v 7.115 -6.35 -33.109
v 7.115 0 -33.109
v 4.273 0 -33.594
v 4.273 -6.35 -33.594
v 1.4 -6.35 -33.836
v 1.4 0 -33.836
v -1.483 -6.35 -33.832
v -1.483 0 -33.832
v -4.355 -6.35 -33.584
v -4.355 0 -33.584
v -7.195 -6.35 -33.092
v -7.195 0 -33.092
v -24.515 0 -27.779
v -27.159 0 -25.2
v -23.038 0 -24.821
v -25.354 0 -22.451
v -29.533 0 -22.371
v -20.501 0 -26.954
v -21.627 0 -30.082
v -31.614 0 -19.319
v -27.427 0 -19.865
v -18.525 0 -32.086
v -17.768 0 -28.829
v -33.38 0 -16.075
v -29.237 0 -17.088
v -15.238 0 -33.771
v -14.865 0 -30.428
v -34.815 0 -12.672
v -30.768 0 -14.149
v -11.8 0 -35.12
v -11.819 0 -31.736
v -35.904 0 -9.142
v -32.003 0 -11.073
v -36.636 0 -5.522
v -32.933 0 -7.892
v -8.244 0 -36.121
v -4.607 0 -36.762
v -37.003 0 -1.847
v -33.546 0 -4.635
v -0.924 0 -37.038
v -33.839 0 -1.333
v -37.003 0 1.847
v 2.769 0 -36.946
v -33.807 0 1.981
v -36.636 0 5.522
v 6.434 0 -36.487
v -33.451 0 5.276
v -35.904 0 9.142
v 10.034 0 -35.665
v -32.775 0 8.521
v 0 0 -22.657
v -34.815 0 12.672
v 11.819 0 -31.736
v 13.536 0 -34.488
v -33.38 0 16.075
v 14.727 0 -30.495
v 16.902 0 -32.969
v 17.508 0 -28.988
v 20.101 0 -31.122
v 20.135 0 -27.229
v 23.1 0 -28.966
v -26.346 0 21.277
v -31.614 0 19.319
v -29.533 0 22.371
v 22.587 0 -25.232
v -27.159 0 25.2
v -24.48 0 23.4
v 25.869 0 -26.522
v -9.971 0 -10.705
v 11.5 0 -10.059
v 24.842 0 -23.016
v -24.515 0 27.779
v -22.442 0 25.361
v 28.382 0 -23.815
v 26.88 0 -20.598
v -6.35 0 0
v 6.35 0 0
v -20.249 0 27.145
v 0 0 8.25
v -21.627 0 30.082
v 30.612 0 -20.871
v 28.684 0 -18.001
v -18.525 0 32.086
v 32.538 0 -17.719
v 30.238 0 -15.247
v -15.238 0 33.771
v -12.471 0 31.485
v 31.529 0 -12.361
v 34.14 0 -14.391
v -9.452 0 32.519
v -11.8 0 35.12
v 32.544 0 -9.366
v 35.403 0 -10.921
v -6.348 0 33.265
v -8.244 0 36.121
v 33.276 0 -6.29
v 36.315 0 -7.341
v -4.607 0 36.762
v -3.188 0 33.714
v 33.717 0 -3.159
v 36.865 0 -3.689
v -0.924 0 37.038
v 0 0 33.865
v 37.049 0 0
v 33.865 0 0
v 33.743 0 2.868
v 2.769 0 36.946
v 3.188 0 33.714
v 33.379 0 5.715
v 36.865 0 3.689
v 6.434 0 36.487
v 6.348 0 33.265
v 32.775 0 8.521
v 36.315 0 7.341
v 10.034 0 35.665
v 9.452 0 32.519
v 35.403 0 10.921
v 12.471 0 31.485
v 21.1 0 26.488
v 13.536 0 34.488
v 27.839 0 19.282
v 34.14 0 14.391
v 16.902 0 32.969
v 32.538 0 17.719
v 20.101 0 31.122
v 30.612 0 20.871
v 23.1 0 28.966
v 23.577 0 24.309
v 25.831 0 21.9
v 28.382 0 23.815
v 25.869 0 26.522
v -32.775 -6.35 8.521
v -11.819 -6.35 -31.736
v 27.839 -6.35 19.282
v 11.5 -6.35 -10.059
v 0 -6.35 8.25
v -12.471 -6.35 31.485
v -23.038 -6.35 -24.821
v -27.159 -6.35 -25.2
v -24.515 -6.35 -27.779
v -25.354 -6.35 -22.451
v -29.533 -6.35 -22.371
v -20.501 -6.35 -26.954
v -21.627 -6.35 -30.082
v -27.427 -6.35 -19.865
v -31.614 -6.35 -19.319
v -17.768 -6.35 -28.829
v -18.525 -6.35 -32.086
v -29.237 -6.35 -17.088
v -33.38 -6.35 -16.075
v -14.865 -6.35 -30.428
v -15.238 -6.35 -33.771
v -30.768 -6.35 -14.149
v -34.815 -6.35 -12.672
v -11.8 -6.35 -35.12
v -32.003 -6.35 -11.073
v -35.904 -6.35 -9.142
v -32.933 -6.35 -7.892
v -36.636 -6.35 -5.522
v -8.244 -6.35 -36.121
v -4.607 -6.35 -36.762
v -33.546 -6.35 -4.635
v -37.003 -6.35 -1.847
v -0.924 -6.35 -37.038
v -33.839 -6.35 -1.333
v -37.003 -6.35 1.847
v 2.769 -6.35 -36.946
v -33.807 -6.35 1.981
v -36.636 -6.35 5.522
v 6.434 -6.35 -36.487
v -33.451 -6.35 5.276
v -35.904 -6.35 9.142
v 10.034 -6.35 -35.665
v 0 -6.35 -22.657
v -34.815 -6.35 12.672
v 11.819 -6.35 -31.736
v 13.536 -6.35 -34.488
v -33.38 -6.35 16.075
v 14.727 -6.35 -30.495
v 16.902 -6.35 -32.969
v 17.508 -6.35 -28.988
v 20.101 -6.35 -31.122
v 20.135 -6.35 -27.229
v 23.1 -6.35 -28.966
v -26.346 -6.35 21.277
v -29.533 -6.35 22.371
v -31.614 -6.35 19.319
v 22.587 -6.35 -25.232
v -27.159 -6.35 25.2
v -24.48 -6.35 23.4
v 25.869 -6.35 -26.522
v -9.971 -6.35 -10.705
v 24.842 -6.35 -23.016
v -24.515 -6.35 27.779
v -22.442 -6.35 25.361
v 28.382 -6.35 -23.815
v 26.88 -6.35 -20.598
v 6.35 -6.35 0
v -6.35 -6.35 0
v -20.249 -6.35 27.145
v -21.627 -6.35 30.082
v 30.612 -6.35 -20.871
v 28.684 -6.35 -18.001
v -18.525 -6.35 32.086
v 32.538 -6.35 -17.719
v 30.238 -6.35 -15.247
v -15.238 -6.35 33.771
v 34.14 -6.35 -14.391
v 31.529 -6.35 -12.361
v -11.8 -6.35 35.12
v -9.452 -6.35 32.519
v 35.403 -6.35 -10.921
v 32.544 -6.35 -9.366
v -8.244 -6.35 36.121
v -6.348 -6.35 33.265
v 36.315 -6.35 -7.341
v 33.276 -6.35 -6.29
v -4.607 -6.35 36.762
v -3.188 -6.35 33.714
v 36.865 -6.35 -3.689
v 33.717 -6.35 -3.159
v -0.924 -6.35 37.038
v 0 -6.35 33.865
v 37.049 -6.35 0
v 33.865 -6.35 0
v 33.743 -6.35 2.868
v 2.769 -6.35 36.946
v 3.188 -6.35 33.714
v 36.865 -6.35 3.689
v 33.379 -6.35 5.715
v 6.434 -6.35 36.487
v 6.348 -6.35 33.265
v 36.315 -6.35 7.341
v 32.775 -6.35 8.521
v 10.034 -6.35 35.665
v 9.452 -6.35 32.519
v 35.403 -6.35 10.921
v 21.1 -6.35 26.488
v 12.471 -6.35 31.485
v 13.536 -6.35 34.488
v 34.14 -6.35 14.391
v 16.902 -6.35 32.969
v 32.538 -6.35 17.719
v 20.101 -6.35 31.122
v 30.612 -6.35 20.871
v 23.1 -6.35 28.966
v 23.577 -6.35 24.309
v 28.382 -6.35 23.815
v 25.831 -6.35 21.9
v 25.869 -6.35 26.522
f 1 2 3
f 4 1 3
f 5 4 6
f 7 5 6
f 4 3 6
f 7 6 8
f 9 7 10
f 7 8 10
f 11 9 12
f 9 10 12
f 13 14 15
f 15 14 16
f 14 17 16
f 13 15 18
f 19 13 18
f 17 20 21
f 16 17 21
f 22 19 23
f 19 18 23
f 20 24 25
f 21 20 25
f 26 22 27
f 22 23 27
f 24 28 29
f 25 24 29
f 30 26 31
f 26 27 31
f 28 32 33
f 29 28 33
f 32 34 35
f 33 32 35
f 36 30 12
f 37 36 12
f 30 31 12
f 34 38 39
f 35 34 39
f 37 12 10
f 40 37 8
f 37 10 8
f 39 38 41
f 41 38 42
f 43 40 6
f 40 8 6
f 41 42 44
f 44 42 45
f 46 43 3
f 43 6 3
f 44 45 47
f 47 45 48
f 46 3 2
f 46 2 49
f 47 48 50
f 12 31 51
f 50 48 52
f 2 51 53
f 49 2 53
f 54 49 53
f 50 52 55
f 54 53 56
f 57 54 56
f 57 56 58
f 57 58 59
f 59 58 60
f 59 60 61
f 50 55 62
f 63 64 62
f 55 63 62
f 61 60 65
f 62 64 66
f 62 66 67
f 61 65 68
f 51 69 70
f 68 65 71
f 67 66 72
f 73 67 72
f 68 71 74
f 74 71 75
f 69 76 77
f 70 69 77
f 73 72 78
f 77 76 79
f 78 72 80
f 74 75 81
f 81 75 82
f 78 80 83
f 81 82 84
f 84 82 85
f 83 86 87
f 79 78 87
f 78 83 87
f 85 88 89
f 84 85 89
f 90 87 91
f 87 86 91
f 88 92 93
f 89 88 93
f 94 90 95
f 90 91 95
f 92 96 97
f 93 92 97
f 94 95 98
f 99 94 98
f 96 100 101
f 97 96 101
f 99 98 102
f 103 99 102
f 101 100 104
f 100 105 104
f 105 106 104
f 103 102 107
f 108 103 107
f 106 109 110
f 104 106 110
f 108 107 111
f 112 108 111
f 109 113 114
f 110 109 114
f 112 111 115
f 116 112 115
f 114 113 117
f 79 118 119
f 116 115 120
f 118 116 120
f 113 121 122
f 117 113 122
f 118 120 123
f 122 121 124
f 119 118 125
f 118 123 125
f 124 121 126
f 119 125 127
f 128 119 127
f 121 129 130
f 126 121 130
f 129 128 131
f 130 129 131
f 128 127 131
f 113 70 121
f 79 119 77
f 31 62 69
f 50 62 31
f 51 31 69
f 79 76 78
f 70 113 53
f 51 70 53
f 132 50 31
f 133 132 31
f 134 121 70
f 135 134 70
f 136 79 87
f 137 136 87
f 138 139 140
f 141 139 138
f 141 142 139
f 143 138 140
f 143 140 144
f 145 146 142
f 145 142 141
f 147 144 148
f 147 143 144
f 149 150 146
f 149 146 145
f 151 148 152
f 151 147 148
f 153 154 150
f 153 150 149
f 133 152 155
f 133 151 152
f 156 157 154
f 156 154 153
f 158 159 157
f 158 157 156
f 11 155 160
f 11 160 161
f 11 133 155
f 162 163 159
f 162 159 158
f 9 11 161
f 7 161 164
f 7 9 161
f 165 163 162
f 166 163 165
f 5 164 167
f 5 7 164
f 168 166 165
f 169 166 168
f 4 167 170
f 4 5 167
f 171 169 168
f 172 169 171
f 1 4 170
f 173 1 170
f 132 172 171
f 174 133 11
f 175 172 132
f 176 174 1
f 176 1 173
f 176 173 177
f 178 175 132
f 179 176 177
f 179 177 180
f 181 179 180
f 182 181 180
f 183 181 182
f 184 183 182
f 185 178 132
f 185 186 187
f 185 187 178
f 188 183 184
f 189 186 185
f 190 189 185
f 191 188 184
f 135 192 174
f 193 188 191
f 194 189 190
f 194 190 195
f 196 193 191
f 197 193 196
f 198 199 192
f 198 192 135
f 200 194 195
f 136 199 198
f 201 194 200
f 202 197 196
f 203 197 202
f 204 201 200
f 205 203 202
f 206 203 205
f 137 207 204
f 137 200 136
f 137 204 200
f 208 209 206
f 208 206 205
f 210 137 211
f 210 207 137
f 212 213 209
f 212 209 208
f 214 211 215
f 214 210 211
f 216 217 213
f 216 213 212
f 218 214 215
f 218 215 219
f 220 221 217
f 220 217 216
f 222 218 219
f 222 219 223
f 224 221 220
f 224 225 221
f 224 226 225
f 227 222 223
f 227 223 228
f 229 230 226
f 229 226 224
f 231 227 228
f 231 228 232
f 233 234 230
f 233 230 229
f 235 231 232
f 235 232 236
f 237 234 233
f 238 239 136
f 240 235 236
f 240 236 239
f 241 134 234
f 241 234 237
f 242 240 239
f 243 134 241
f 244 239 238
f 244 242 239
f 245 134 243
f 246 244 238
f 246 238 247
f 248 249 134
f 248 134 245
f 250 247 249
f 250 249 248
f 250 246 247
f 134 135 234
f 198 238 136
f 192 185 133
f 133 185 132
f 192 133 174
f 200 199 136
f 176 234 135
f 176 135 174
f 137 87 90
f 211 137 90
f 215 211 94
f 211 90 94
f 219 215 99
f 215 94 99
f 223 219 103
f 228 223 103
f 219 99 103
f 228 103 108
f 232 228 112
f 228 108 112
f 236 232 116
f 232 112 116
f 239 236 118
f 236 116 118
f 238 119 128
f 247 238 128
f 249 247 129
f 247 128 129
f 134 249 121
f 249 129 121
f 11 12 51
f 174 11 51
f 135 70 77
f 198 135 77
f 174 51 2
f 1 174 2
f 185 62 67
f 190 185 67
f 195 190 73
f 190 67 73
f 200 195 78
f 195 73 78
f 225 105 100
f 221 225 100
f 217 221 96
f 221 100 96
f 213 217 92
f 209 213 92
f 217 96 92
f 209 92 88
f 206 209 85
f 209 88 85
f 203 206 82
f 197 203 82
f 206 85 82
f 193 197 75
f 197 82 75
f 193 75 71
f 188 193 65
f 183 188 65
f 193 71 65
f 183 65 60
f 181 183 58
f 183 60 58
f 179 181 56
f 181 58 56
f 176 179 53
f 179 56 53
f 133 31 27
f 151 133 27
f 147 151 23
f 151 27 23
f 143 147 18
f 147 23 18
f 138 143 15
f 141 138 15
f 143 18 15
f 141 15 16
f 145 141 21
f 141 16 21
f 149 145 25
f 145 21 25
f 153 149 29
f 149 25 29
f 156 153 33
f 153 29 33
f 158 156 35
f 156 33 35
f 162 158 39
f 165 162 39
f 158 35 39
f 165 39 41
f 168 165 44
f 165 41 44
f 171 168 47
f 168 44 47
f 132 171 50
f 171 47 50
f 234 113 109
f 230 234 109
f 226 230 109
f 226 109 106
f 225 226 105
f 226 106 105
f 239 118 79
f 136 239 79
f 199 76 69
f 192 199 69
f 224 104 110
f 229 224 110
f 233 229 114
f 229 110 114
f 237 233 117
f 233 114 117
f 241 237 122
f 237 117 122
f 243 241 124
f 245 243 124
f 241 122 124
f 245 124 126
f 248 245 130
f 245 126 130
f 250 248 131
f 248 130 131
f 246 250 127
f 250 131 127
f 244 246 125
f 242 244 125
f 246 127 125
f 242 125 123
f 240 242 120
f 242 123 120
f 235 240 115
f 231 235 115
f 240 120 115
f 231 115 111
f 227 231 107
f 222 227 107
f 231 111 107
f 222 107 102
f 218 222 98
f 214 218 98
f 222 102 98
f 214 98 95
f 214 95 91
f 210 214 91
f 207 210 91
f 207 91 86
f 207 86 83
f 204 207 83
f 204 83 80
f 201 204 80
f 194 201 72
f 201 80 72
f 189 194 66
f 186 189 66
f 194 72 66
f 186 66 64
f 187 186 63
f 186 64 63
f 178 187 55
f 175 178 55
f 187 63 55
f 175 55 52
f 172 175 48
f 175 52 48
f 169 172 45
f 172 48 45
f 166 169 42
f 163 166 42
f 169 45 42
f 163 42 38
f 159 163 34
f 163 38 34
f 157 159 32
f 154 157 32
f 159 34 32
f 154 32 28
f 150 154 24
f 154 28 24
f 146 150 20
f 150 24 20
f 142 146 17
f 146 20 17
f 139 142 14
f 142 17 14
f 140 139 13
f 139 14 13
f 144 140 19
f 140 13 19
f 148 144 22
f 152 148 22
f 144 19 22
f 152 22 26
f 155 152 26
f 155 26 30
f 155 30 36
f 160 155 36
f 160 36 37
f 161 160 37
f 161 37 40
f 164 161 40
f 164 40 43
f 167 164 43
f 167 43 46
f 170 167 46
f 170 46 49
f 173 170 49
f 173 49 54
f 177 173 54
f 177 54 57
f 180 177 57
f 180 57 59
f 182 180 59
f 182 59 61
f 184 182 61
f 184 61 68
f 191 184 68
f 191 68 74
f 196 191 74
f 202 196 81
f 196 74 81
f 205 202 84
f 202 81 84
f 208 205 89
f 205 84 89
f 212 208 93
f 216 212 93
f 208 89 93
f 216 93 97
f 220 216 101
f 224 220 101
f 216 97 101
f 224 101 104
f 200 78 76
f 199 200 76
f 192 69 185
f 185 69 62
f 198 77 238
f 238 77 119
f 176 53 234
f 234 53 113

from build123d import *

# Parameters (mm, degrees)
F0_R     = 37.049444
F1_DEPTH = 6.35


with BuildPart() as f1:
    # F0 (on Front) → F1 (new body)
    with BuildSketch(Plane.XZ):
        Circle(F0_R)
        with BuildLine():
            ThreePointArc((32.775383, 8.520914), (33.591419, 4.295144), (33.864904, 0))
            ThreePointArc((33.864904, 0), (27.812587, -19.320759), (11.818969, -31.735527))
            ThreePointArc((11.818969, -31.735527), (9.491898, -32.507469), (7.115076, -33.109023))
            ThreePointArc((7.115076, -33.109023), (-0.041069, -33.864879), (-7.19536, -33.091668))
            ThreePointArc((-7.19536, -33.091668), (-9.531315, -32.495934), (-11.818969, -31.735527))
            ThreePointArc((-11.818969, -31.735527), (-30.038464, -15.637212), (-32.775383, 8.520914))
            ThreePointArc((-32.775383, 8.520914), (-30.241055, 15.241729), (-26.346281, 21.276869))
            ThreePointArc((-26.346281, 21.276869), (-23.481444, 24.401916), (-20.248603, 27.144535))
            ThreePointArc((-20.248603, 27.144535), (-16.503137, 29.571577), (-12.471031, 31.484998))
            ThreePointArc((-12.471031, 31.484998), (0, 33.864904), (12.471031, 31.484998))
            ThreePointArc((12.471031, 31.484998), (16.970465, 29.305887), (21.100053, 26.4881))
            ThreePointArc((21.100053, 26.4881), (24.733428, 23.131996), (27.839175, 19.282428))
            ThreePointArc((27.839175, 19.282428), (30.781223, 14.119065), (32.775383, 8.520914))
        make_face(mode=Mode.SUBTRACT)
        with BuildLine():
            Line((11.818969, -31.735527), (32.775383, 8.520914))
            ThreePointArc((32.775383, 8.520914), (30.781223, 14.119065), (27.839175, 19.282428))
            Line((27.839175, 19.282428), (11.500335, -10.058812))
            Line((11.500335, -10.058812), (6.35, 0))
            Line((6.35, 0), (-6.35, 0))
            Line((-6.35, 0), (-9.970913, -10.704888))
            Line((-9.970913, -10.704888), (-26.346281, 21.276869))
            ThreePointArc((-26.346281, 21.276869), (-30.241055, 15.241729), (-32.775383, 8.520914))
            Line((-32.775383, 8.520914), (-11.818969, -31.735527))
            ThreePointArc((-11.818969, -31.735527), (-9.531315, -32.495934), (-7.19536, -33.091668))
            Line((-7.19536, -33.091668), (0, -22.65686))
            Line((0, -22.65686), (7.115076, -33.109023))
            ThreePointArc((7.115076, -33.109023), (9.491898, -32.507469), (11.818969, -31.735527))
        make_face()
        with BuildLine():
            Line((6.35, 0), (21.100053, 26.4881))
            ThreePointArc((21.100053, 26.4881), (16.970465, 29.305887), (12.471031, 31.484998))
            Line((12.471031, 31.484998), (0, 8.249764))
            Line((0, 8.249764), (-12.471031, 31.484998))
            ThreePointArc((-12.471031, 31.484998), (-16.503137, 29.571577), (-20.248603, 27.144535))
            Line((-20.248603, 27.144535), (-6.35, 0))
            Line((-6.35, 0), (6.35, 0))
        make_face()
    extrude(amount=F1_DEPTH)


solid = f1.part
